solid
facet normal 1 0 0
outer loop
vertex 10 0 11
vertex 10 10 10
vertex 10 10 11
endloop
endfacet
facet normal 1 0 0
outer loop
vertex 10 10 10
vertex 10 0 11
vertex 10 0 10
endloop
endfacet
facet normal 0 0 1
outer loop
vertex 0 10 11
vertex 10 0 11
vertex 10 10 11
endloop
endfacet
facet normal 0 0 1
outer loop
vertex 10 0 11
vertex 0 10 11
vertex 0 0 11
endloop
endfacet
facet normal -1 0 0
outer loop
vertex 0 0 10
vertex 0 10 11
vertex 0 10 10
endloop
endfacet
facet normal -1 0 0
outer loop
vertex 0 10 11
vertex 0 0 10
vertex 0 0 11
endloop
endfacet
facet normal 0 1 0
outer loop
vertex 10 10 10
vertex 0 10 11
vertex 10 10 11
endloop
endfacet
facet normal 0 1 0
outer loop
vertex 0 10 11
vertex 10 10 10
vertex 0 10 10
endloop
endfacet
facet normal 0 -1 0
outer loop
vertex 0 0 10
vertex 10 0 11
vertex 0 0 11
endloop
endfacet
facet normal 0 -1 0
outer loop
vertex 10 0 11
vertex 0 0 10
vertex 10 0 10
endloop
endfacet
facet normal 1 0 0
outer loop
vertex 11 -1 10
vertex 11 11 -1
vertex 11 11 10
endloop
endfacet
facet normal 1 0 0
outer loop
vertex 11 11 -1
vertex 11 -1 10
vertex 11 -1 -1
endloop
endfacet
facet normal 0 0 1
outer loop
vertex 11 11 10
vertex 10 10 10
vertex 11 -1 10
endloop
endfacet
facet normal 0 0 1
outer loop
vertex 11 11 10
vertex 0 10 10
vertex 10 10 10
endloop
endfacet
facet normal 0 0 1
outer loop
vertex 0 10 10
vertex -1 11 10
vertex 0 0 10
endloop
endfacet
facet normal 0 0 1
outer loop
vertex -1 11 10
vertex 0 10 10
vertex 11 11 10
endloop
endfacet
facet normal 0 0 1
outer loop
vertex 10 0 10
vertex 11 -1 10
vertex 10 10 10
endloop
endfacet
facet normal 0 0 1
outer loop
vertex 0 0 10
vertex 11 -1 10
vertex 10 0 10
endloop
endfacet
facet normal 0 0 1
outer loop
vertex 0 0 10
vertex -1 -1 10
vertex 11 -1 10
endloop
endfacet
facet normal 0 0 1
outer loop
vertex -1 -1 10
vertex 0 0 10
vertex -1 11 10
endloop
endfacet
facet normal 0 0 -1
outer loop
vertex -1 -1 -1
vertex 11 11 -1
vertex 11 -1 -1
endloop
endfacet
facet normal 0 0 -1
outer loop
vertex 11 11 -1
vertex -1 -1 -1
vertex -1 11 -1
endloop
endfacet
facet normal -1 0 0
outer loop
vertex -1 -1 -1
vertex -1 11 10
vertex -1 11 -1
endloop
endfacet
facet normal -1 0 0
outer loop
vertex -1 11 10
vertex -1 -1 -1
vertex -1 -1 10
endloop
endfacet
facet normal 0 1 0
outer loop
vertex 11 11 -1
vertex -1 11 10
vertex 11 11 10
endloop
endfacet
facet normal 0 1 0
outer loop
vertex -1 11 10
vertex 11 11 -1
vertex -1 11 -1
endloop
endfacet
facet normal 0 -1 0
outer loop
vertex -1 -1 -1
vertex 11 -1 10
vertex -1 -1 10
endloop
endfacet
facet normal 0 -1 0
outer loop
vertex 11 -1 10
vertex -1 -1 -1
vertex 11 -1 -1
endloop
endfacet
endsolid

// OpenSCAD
// Unit of length: Unit.MM
union()
{
   color(c = [1.0, 0.0, 0.0, 1.0])
   {
      cube(size = [10.0, 10.0, 11.0], center = false);
   }
   translate(v = [-1.0, -1.0, -1.0])
   {
      cube(size = [12.0, 12.0, 11.0], center = false);
   }
}
